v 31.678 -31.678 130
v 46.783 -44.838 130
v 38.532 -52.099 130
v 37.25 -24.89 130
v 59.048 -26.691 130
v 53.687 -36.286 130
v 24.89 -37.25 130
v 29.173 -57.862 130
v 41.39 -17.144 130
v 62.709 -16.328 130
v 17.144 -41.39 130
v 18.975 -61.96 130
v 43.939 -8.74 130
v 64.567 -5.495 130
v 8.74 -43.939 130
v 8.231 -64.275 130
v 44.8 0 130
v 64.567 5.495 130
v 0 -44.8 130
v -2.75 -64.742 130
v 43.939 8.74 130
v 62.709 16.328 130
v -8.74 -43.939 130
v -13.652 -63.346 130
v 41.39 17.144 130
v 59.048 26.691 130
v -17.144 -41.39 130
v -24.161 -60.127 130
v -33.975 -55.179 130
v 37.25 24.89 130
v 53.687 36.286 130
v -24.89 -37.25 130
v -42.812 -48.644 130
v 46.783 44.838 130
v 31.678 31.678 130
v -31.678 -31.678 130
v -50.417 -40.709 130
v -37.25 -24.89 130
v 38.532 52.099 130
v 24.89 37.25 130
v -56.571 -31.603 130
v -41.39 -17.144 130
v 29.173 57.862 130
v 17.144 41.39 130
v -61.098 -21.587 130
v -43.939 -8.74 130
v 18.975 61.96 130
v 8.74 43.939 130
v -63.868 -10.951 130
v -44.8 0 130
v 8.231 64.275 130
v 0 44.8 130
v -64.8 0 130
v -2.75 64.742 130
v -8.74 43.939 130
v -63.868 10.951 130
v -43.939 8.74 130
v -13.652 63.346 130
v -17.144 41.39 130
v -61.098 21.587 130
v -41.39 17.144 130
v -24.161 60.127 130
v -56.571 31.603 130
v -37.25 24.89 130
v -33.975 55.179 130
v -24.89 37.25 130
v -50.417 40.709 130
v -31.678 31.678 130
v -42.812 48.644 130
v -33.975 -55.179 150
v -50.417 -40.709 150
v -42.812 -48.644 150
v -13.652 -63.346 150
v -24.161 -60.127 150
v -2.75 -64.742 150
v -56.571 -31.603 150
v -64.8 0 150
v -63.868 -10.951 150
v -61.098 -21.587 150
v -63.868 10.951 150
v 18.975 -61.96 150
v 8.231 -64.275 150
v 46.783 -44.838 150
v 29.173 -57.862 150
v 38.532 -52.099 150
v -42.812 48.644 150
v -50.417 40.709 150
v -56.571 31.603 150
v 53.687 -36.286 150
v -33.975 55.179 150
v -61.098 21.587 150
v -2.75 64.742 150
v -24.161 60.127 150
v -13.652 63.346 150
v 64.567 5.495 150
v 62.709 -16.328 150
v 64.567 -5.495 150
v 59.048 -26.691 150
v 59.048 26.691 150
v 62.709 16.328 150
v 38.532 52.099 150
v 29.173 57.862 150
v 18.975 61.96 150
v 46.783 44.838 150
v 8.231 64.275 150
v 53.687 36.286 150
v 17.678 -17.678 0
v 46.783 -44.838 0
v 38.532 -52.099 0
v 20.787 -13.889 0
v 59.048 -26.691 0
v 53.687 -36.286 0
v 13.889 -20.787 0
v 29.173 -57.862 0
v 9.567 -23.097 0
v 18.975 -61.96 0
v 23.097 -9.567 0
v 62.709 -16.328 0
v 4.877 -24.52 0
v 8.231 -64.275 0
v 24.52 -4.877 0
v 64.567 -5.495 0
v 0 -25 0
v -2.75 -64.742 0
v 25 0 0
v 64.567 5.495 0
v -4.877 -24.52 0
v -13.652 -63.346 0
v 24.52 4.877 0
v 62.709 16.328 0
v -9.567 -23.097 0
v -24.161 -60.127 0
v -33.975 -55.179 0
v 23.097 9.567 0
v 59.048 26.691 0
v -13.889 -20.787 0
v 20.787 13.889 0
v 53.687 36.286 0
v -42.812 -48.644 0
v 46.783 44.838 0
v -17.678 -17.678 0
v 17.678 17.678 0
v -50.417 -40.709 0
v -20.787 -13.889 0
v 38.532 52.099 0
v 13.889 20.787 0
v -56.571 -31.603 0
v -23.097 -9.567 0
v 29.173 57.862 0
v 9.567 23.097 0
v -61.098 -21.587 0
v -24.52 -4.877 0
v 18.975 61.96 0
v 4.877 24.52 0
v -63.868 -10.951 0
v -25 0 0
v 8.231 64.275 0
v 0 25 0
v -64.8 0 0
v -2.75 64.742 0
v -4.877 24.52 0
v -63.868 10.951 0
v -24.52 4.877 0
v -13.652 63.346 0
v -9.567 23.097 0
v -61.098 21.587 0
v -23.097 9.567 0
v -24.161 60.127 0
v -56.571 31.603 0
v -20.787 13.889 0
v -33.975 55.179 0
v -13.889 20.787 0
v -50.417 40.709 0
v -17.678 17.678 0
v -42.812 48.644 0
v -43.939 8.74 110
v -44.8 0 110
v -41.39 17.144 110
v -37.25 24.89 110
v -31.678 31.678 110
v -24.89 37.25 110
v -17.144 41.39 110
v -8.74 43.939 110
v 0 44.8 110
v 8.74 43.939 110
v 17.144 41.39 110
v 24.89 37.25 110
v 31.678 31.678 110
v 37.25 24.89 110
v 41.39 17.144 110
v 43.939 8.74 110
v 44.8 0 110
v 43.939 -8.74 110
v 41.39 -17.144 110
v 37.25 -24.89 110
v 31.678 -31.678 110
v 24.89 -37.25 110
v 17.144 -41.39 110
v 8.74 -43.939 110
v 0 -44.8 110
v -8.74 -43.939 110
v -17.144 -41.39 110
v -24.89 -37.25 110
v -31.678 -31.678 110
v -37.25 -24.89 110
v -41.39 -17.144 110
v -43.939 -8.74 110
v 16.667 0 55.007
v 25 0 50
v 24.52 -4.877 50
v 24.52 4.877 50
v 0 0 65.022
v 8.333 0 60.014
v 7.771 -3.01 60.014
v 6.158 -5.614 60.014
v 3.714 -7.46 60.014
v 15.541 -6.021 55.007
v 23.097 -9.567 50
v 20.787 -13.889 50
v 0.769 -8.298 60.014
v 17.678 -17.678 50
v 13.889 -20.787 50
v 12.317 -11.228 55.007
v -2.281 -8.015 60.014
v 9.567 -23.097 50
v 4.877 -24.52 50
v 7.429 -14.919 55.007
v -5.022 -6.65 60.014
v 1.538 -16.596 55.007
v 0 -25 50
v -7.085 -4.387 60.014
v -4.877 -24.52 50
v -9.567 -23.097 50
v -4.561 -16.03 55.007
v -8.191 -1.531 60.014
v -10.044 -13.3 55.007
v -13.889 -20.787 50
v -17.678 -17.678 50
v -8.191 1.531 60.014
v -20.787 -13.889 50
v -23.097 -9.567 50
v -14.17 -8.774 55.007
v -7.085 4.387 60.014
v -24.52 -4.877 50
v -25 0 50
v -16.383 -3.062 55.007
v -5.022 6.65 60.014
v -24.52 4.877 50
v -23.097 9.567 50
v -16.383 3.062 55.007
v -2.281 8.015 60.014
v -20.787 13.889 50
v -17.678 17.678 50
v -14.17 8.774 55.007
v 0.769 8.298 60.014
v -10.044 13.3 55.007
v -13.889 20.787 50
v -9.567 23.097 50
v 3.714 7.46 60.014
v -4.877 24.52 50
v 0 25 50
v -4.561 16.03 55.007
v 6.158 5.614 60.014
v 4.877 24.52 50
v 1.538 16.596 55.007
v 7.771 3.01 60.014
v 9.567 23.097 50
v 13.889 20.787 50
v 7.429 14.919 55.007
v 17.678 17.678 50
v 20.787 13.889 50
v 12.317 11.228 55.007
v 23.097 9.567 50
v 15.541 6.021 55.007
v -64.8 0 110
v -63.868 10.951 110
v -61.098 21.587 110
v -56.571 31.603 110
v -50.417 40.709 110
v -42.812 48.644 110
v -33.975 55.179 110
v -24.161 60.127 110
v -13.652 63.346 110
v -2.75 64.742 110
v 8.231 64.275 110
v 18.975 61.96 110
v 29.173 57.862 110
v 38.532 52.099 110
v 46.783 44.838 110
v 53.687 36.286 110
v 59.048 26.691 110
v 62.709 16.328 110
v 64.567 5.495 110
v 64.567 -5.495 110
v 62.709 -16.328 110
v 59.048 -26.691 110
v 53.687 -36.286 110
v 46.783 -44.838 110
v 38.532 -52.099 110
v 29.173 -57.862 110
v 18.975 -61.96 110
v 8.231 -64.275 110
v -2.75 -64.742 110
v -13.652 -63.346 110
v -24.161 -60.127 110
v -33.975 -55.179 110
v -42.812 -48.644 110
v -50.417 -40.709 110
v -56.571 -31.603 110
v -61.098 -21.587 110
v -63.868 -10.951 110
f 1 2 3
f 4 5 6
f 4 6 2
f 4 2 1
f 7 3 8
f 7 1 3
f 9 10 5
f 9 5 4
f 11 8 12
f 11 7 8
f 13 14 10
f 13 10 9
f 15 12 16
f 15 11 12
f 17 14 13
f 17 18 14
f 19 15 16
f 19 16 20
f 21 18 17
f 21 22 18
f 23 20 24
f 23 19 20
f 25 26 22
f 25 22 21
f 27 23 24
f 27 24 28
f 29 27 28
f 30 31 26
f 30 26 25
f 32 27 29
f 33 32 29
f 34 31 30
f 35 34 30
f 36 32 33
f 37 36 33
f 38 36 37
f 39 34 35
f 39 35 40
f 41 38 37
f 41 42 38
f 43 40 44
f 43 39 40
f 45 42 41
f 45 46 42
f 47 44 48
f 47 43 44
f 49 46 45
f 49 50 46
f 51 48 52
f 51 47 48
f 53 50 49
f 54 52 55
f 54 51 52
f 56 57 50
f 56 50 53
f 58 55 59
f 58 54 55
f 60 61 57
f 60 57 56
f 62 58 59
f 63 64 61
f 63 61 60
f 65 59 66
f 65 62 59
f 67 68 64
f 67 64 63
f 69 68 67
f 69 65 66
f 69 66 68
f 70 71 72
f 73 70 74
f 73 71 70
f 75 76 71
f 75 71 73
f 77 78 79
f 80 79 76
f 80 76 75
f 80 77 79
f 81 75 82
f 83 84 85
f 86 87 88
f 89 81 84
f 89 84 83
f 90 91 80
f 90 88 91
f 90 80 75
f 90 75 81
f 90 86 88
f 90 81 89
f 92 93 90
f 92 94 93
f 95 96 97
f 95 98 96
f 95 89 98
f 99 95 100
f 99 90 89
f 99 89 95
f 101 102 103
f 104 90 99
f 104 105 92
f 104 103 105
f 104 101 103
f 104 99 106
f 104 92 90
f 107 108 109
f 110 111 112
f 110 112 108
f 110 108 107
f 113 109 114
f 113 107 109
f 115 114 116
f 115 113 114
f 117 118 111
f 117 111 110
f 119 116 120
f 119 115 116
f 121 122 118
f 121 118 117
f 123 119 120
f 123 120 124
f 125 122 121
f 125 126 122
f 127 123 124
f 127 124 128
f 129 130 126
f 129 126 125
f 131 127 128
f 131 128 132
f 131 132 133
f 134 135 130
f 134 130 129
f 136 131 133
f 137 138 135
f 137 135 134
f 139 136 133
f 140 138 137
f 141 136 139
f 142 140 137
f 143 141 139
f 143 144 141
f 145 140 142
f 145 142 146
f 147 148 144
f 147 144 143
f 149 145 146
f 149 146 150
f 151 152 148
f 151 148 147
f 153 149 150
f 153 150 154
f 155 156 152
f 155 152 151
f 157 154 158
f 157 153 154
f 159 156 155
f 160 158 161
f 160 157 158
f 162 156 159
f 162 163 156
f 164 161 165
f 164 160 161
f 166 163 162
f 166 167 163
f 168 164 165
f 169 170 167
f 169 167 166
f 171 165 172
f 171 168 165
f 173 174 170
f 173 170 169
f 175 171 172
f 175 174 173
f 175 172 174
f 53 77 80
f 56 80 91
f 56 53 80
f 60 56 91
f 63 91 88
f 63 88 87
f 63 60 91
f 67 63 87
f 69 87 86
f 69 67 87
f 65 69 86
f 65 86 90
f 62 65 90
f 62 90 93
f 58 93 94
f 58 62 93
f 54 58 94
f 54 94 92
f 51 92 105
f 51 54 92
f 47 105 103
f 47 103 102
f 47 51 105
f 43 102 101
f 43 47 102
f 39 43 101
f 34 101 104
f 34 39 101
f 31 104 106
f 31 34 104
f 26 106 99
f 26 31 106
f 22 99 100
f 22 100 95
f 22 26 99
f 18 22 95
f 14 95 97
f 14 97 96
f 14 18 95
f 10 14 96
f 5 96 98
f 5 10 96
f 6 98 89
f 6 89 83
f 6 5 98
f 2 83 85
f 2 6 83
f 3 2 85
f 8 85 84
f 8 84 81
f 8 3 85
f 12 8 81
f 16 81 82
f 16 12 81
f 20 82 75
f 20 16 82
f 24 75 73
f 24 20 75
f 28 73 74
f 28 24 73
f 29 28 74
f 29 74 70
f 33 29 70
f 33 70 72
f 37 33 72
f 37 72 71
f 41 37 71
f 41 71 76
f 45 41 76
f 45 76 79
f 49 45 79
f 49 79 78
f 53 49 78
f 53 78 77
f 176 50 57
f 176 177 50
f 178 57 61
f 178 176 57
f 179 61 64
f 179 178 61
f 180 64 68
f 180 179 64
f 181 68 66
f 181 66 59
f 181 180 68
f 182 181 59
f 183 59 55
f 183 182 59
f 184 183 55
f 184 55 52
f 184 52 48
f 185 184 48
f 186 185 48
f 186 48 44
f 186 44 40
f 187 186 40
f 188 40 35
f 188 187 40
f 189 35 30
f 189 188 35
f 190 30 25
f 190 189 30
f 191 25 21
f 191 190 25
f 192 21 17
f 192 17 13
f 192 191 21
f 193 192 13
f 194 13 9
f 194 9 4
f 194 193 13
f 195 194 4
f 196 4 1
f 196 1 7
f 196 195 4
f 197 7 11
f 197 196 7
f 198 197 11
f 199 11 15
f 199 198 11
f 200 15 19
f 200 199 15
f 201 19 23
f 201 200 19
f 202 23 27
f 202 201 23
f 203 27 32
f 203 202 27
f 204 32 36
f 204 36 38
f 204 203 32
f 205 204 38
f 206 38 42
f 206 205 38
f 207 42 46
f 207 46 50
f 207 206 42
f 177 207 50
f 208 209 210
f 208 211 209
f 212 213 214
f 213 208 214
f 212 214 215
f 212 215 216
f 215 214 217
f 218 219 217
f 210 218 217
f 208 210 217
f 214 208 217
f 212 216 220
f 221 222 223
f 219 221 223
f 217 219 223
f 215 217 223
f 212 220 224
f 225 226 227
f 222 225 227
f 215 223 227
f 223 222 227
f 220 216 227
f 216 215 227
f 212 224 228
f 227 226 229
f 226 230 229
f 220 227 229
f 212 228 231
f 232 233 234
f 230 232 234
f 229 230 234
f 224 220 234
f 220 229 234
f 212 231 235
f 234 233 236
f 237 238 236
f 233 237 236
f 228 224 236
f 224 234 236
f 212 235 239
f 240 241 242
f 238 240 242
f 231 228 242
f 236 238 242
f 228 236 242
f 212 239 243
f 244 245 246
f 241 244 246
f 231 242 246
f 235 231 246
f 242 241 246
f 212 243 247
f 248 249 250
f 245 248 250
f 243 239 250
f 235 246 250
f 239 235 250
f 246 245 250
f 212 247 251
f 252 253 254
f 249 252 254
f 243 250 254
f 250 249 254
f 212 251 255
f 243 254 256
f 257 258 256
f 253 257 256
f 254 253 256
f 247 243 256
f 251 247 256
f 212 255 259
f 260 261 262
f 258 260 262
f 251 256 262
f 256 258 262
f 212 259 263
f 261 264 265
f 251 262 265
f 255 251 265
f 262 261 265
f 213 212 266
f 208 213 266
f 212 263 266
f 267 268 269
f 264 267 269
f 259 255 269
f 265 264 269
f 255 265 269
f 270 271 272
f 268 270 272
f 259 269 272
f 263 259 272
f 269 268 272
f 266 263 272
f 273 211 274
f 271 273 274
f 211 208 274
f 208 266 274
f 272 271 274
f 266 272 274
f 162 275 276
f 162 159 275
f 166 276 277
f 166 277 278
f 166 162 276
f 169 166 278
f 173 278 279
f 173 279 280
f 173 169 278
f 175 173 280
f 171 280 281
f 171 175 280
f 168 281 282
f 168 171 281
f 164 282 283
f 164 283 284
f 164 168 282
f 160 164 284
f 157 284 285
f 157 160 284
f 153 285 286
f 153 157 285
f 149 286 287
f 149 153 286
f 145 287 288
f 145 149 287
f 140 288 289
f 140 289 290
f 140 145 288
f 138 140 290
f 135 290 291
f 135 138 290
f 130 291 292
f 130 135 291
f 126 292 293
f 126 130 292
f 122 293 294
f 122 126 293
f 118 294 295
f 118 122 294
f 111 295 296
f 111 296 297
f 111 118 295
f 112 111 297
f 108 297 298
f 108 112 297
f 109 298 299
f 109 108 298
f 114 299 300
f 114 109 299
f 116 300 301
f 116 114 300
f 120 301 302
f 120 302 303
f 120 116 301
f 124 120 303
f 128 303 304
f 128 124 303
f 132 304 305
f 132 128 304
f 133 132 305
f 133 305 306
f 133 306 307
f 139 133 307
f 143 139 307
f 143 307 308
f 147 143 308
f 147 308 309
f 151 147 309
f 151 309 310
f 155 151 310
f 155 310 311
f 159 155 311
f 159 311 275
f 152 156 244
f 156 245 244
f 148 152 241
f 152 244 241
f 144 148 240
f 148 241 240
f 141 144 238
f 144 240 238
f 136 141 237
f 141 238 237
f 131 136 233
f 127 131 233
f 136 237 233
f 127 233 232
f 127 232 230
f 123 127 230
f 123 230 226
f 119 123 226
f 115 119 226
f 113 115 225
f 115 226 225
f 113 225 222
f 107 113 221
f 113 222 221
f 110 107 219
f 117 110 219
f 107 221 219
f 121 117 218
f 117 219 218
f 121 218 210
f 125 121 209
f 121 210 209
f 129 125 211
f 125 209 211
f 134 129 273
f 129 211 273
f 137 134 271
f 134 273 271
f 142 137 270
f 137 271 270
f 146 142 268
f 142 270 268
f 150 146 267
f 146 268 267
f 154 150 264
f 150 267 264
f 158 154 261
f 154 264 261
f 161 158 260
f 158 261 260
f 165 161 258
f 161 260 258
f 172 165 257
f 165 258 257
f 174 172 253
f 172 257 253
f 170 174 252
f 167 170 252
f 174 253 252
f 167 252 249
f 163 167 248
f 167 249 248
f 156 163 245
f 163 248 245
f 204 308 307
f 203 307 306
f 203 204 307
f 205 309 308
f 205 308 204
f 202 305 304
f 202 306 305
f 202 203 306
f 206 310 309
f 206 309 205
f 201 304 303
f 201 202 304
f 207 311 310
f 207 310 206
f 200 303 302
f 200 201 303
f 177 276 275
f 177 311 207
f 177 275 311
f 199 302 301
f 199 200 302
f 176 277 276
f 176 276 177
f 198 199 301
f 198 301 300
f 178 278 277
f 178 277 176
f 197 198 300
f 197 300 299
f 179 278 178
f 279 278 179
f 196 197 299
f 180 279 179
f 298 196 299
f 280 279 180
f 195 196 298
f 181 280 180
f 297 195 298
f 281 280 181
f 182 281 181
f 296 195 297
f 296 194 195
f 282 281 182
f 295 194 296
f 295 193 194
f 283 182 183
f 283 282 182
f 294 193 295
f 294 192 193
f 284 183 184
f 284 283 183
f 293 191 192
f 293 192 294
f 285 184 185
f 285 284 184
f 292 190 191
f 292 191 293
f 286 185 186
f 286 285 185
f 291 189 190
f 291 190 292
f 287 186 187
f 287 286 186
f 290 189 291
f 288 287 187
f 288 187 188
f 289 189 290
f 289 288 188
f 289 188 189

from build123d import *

# Parameters (mm, degrees)
F3_D     = 50
F3_DEPTH = 50
F3_TIP   = 15.0215154757


with BuildPart() as f1:
    # F0 (on Front) → F1 (revolve)
    with BuildSketch(Plane.XZ):
        Polygon((-64.8, 0), (0, 0), (0, 150), (-64.8, 150), (-64.8, 130), (-44.8, 130), (-44.8, 110), (-64.8, 110), align=None)
    revolve(axis=Axis((0, 0, 75), (0, 0, -1)))

    # F3
    with Locations(Plane(origin=(0, 0, 0), x_dir=(1, 0, 0), z_dir=(0, 0, -1))):
        with Locations((0, 0)):
            Hole(F3_D / 2, depth=F3_DEPTH)
            with Locations((0, 0, -(F3_DEPTH + F3_TIP / 2))):  # 118° drill point
                Cone(0, F3_D / 2, F3_TIP, mode=Mode.SUBTRACT)


solid = f1.part
